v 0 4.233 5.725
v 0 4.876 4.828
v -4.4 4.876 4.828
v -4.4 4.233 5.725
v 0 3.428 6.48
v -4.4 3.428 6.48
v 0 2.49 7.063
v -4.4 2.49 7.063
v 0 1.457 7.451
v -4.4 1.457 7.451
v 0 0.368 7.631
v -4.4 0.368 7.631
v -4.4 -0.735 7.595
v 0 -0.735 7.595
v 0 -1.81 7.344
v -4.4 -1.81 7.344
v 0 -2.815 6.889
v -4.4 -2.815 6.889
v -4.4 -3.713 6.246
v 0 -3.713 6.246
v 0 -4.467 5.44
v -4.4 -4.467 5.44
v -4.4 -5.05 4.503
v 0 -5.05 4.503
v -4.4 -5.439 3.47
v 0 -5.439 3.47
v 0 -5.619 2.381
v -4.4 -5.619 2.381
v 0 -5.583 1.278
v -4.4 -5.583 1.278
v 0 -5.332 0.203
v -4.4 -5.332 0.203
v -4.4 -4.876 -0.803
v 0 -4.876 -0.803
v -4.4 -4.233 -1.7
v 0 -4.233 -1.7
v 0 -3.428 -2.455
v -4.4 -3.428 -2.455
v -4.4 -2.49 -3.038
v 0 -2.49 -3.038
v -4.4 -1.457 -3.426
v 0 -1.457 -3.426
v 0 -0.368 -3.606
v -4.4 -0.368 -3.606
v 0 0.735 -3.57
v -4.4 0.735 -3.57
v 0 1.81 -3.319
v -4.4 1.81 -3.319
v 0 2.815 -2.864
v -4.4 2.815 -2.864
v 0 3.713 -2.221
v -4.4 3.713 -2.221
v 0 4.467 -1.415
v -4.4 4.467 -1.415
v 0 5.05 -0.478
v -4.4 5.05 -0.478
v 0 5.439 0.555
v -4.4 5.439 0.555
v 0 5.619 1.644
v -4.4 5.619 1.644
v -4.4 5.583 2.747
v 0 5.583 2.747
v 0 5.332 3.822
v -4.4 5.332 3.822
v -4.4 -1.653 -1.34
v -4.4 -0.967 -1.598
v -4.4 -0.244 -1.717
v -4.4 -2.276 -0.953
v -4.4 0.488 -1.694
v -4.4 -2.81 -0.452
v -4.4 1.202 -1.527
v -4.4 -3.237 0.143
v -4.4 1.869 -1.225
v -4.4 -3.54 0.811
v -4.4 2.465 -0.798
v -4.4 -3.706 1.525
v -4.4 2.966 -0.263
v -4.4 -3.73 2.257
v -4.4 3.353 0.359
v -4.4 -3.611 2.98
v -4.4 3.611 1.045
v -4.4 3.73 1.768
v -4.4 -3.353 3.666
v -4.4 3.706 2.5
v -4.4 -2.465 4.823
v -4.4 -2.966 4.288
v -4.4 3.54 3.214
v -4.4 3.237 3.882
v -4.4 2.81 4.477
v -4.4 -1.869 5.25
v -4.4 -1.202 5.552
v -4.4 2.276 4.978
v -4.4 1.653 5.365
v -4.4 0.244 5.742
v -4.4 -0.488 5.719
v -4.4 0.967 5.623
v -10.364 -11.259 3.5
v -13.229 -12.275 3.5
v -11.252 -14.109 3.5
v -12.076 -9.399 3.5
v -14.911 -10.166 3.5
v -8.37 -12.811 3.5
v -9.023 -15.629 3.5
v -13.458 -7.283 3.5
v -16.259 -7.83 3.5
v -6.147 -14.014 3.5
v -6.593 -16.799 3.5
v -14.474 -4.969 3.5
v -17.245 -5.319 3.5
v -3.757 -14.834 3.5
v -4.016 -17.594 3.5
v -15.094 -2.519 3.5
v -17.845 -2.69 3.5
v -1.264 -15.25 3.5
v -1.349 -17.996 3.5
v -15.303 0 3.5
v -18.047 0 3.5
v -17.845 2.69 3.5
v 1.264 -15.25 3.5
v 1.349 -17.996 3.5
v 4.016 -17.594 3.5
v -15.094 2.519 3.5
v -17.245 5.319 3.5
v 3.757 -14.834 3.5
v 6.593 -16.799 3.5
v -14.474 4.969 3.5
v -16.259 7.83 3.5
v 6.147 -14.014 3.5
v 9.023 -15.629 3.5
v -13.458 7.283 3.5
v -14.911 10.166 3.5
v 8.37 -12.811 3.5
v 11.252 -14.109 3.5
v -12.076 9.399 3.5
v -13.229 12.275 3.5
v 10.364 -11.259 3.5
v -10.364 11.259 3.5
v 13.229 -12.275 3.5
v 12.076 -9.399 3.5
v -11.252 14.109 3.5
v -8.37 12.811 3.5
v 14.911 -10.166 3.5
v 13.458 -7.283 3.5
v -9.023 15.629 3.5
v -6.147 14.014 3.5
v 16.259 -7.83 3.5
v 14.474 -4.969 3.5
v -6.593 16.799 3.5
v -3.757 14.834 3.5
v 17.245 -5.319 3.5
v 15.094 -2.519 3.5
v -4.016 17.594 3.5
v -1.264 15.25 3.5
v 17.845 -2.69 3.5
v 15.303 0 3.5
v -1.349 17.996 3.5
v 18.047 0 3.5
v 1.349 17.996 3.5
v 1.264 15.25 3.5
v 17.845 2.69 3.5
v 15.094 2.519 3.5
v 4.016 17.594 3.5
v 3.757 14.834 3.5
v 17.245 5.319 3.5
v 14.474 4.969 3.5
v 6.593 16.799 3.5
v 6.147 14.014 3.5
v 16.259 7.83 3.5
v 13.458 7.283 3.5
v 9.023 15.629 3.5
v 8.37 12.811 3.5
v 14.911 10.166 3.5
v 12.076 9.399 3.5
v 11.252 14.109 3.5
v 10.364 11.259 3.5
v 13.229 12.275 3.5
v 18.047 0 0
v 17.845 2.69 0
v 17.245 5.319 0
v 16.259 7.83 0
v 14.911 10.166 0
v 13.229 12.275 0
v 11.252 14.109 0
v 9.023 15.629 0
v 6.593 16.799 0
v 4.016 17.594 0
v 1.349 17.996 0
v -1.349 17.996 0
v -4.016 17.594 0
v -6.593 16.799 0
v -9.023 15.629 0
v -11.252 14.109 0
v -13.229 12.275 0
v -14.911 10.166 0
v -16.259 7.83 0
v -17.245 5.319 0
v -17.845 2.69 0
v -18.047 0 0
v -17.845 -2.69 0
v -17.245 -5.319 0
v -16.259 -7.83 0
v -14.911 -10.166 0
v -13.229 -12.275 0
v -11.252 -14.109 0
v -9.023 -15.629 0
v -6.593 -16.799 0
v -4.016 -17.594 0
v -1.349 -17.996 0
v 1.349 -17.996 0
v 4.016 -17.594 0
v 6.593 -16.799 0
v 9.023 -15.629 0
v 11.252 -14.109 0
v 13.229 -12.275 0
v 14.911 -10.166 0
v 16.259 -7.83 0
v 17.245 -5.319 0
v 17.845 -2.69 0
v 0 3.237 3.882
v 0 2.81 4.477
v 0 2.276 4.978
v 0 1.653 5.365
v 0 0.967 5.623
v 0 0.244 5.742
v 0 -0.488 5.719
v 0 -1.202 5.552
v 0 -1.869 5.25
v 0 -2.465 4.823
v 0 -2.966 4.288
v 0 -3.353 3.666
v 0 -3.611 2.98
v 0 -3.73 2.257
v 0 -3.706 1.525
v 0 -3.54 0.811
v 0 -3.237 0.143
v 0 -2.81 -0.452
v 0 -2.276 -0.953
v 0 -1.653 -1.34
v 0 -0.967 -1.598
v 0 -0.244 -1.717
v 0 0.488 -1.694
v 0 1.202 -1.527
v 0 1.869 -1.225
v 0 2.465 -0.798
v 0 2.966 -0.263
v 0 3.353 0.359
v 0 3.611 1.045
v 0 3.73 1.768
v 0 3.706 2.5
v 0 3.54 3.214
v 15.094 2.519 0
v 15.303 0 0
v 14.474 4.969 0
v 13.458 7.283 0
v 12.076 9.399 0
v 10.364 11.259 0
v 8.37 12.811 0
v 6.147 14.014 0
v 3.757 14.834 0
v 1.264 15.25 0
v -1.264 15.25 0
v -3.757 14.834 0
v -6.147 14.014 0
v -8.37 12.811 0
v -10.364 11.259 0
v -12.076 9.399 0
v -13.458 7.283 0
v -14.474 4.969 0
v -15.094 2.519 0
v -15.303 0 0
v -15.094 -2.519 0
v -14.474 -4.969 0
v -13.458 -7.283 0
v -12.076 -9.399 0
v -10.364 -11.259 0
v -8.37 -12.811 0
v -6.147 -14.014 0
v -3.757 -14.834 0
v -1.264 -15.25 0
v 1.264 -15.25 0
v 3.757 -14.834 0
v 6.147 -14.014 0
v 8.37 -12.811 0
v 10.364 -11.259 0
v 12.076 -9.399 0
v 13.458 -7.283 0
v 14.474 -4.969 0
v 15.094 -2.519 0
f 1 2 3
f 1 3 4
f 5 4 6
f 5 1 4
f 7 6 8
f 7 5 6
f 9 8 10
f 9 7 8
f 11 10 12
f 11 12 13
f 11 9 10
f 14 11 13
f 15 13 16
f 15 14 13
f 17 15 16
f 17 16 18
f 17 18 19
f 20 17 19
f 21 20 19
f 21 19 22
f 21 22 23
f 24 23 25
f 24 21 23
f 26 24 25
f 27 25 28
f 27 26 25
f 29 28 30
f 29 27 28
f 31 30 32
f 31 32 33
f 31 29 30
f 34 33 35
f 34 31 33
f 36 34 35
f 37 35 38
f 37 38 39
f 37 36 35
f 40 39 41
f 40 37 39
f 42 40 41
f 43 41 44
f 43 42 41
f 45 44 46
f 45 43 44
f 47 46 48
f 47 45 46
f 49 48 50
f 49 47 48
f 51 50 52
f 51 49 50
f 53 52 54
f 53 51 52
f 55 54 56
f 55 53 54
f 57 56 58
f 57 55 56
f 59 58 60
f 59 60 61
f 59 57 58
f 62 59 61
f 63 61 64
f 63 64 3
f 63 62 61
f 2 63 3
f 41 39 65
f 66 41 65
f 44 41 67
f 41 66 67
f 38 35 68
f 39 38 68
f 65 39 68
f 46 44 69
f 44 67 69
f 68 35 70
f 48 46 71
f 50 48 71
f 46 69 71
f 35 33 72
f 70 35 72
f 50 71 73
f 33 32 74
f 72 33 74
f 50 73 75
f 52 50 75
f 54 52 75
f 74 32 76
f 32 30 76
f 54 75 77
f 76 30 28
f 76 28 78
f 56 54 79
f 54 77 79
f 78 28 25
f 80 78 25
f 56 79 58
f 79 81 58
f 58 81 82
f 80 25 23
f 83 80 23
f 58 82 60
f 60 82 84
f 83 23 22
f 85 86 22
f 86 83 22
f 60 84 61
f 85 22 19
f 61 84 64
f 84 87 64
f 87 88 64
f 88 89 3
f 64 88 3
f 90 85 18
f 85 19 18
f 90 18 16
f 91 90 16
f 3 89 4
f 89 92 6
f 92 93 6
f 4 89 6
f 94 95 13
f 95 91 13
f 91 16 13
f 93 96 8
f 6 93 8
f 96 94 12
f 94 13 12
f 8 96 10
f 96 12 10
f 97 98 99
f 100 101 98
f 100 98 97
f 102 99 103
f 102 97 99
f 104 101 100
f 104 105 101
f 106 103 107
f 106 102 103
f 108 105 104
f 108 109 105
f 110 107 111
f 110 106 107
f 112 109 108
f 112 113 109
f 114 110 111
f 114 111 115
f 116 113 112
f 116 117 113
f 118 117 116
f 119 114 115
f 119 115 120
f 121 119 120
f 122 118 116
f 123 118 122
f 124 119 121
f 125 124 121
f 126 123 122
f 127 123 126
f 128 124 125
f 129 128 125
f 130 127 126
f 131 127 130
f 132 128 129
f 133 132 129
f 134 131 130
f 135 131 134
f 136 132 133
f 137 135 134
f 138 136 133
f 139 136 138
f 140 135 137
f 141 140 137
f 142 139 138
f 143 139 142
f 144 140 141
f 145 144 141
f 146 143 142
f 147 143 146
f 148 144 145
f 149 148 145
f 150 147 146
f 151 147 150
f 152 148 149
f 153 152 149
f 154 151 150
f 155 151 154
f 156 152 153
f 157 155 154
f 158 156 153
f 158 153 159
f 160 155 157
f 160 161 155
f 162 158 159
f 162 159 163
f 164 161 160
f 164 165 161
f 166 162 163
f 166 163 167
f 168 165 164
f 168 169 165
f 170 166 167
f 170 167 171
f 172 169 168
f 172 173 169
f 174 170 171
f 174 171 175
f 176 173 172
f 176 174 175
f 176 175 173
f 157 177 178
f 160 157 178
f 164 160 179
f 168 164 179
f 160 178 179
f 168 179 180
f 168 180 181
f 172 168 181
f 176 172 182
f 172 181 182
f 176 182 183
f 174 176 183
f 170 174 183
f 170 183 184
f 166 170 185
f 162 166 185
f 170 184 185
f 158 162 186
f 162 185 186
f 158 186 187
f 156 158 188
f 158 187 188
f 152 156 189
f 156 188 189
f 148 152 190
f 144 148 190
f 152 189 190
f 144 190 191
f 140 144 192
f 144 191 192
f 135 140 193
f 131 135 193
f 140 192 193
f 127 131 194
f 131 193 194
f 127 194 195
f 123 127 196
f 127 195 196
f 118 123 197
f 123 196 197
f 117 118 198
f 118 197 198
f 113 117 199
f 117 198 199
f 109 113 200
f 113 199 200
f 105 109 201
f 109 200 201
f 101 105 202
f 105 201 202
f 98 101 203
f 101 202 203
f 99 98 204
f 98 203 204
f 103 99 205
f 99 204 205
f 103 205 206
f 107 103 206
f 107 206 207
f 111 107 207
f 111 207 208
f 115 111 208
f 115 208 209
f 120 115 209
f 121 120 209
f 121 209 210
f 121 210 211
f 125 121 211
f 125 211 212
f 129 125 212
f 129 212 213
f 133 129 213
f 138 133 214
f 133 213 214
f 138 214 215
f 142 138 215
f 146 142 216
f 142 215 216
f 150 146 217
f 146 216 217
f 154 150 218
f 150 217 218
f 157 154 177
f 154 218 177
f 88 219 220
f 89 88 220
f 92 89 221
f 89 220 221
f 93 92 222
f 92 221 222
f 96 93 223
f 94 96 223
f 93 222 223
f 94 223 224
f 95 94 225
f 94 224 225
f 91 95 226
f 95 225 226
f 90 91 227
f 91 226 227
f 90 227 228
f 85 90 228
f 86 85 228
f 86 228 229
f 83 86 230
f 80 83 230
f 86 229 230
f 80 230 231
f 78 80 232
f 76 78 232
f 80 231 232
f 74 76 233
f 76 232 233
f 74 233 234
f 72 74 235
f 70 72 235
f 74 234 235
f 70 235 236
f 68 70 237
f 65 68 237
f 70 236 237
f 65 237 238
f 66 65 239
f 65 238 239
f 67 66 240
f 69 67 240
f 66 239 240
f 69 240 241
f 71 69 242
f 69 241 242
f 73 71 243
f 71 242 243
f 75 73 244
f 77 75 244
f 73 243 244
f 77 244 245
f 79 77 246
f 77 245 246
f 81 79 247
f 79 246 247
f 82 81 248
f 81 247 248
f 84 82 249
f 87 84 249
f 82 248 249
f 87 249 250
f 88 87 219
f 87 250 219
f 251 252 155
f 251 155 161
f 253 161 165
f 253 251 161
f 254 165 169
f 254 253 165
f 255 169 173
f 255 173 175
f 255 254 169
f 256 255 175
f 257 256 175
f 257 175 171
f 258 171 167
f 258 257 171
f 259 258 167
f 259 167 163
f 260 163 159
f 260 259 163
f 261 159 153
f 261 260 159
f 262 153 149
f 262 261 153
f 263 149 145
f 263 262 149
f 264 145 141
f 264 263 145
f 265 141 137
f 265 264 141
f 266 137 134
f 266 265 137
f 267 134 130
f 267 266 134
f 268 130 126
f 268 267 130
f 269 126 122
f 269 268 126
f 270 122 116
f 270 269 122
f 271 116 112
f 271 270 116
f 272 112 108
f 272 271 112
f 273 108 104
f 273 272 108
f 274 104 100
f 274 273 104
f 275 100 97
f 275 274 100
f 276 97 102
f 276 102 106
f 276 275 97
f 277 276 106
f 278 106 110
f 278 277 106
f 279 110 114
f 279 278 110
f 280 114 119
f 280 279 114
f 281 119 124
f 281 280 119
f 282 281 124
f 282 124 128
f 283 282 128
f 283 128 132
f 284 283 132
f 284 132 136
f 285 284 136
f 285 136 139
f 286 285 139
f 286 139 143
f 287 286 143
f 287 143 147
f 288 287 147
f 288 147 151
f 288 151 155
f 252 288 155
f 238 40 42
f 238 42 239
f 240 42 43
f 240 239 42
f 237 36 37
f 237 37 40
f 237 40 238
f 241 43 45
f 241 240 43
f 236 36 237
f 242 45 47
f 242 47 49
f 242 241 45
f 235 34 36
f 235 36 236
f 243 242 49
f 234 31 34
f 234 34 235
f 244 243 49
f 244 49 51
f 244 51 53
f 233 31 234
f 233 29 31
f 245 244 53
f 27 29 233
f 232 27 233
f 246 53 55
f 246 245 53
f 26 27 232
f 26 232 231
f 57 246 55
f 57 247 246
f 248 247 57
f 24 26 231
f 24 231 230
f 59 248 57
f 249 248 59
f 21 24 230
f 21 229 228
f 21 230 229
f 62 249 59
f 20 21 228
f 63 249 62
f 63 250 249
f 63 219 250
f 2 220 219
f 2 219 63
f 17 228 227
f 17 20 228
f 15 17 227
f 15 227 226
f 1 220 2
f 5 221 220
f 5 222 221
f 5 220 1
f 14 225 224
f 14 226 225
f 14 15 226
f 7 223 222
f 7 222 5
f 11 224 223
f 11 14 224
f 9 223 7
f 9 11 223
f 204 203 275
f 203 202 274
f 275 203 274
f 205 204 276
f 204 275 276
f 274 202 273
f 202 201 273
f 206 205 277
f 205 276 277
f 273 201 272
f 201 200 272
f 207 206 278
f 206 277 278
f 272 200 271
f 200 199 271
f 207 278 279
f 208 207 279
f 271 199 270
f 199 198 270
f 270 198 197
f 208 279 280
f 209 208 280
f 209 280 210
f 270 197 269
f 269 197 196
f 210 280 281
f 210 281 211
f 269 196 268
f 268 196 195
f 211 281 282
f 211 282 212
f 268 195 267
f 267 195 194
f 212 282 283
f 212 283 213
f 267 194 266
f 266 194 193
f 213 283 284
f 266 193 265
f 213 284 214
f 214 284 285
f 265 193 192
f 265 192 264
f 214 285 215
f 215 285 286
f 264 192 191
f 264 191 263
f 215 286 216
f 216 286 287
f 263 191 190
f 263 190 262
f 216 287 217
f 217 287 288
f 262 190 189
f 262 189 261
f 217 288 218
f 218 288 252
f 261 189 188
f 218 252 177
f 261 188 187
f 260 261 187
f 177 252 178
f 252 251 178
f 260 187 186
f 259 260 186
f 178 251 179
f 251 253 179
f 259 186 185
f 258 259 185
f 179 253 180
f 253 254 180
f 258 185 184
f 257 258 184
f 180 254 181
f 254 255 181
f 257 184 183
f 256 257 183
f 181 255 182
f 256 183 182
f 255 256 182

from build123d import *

# Parameters (mm, degrees)
F0_R     = 18.046651
F0_R_2   = 15.302747
F1_DEPTH = 3.5
F2_R     = 5.630678
F2_R_2   = 3.738001
F3_DEPTH = 4.4
F4_ANGLE = 30


with BuildPart() as f1:
    # F0 (on Top) → F1 (new body)
    with BuildSketch(Plane.XY):
        Circle(F0_R)
        Circle(F0_R_2, mode=Mode.SUBTRACT)
    extrude(amount=F1_DEPTH)


with BuildPart() as f3:
    # F2 (on Right) → F3 (new body)
    with BuildSketch(Plane.YZ):
        with Locations((0, 2.0125)):
            Circle(F2_R)
        with Locations((0, 2.0125)):
            Circle(F2_R_2, mode=Mode.SUBTRACT)
    extrude(amount=-F3_DEPTH)


with BuildPart() as f3_1:
    # F4: moved
    add(f3.part.rotate(Axis((0, 0, 2.0125), (1, 0, 0)), F4_ANGLE))


solid = Compound([f1.part, f3_1.part])
